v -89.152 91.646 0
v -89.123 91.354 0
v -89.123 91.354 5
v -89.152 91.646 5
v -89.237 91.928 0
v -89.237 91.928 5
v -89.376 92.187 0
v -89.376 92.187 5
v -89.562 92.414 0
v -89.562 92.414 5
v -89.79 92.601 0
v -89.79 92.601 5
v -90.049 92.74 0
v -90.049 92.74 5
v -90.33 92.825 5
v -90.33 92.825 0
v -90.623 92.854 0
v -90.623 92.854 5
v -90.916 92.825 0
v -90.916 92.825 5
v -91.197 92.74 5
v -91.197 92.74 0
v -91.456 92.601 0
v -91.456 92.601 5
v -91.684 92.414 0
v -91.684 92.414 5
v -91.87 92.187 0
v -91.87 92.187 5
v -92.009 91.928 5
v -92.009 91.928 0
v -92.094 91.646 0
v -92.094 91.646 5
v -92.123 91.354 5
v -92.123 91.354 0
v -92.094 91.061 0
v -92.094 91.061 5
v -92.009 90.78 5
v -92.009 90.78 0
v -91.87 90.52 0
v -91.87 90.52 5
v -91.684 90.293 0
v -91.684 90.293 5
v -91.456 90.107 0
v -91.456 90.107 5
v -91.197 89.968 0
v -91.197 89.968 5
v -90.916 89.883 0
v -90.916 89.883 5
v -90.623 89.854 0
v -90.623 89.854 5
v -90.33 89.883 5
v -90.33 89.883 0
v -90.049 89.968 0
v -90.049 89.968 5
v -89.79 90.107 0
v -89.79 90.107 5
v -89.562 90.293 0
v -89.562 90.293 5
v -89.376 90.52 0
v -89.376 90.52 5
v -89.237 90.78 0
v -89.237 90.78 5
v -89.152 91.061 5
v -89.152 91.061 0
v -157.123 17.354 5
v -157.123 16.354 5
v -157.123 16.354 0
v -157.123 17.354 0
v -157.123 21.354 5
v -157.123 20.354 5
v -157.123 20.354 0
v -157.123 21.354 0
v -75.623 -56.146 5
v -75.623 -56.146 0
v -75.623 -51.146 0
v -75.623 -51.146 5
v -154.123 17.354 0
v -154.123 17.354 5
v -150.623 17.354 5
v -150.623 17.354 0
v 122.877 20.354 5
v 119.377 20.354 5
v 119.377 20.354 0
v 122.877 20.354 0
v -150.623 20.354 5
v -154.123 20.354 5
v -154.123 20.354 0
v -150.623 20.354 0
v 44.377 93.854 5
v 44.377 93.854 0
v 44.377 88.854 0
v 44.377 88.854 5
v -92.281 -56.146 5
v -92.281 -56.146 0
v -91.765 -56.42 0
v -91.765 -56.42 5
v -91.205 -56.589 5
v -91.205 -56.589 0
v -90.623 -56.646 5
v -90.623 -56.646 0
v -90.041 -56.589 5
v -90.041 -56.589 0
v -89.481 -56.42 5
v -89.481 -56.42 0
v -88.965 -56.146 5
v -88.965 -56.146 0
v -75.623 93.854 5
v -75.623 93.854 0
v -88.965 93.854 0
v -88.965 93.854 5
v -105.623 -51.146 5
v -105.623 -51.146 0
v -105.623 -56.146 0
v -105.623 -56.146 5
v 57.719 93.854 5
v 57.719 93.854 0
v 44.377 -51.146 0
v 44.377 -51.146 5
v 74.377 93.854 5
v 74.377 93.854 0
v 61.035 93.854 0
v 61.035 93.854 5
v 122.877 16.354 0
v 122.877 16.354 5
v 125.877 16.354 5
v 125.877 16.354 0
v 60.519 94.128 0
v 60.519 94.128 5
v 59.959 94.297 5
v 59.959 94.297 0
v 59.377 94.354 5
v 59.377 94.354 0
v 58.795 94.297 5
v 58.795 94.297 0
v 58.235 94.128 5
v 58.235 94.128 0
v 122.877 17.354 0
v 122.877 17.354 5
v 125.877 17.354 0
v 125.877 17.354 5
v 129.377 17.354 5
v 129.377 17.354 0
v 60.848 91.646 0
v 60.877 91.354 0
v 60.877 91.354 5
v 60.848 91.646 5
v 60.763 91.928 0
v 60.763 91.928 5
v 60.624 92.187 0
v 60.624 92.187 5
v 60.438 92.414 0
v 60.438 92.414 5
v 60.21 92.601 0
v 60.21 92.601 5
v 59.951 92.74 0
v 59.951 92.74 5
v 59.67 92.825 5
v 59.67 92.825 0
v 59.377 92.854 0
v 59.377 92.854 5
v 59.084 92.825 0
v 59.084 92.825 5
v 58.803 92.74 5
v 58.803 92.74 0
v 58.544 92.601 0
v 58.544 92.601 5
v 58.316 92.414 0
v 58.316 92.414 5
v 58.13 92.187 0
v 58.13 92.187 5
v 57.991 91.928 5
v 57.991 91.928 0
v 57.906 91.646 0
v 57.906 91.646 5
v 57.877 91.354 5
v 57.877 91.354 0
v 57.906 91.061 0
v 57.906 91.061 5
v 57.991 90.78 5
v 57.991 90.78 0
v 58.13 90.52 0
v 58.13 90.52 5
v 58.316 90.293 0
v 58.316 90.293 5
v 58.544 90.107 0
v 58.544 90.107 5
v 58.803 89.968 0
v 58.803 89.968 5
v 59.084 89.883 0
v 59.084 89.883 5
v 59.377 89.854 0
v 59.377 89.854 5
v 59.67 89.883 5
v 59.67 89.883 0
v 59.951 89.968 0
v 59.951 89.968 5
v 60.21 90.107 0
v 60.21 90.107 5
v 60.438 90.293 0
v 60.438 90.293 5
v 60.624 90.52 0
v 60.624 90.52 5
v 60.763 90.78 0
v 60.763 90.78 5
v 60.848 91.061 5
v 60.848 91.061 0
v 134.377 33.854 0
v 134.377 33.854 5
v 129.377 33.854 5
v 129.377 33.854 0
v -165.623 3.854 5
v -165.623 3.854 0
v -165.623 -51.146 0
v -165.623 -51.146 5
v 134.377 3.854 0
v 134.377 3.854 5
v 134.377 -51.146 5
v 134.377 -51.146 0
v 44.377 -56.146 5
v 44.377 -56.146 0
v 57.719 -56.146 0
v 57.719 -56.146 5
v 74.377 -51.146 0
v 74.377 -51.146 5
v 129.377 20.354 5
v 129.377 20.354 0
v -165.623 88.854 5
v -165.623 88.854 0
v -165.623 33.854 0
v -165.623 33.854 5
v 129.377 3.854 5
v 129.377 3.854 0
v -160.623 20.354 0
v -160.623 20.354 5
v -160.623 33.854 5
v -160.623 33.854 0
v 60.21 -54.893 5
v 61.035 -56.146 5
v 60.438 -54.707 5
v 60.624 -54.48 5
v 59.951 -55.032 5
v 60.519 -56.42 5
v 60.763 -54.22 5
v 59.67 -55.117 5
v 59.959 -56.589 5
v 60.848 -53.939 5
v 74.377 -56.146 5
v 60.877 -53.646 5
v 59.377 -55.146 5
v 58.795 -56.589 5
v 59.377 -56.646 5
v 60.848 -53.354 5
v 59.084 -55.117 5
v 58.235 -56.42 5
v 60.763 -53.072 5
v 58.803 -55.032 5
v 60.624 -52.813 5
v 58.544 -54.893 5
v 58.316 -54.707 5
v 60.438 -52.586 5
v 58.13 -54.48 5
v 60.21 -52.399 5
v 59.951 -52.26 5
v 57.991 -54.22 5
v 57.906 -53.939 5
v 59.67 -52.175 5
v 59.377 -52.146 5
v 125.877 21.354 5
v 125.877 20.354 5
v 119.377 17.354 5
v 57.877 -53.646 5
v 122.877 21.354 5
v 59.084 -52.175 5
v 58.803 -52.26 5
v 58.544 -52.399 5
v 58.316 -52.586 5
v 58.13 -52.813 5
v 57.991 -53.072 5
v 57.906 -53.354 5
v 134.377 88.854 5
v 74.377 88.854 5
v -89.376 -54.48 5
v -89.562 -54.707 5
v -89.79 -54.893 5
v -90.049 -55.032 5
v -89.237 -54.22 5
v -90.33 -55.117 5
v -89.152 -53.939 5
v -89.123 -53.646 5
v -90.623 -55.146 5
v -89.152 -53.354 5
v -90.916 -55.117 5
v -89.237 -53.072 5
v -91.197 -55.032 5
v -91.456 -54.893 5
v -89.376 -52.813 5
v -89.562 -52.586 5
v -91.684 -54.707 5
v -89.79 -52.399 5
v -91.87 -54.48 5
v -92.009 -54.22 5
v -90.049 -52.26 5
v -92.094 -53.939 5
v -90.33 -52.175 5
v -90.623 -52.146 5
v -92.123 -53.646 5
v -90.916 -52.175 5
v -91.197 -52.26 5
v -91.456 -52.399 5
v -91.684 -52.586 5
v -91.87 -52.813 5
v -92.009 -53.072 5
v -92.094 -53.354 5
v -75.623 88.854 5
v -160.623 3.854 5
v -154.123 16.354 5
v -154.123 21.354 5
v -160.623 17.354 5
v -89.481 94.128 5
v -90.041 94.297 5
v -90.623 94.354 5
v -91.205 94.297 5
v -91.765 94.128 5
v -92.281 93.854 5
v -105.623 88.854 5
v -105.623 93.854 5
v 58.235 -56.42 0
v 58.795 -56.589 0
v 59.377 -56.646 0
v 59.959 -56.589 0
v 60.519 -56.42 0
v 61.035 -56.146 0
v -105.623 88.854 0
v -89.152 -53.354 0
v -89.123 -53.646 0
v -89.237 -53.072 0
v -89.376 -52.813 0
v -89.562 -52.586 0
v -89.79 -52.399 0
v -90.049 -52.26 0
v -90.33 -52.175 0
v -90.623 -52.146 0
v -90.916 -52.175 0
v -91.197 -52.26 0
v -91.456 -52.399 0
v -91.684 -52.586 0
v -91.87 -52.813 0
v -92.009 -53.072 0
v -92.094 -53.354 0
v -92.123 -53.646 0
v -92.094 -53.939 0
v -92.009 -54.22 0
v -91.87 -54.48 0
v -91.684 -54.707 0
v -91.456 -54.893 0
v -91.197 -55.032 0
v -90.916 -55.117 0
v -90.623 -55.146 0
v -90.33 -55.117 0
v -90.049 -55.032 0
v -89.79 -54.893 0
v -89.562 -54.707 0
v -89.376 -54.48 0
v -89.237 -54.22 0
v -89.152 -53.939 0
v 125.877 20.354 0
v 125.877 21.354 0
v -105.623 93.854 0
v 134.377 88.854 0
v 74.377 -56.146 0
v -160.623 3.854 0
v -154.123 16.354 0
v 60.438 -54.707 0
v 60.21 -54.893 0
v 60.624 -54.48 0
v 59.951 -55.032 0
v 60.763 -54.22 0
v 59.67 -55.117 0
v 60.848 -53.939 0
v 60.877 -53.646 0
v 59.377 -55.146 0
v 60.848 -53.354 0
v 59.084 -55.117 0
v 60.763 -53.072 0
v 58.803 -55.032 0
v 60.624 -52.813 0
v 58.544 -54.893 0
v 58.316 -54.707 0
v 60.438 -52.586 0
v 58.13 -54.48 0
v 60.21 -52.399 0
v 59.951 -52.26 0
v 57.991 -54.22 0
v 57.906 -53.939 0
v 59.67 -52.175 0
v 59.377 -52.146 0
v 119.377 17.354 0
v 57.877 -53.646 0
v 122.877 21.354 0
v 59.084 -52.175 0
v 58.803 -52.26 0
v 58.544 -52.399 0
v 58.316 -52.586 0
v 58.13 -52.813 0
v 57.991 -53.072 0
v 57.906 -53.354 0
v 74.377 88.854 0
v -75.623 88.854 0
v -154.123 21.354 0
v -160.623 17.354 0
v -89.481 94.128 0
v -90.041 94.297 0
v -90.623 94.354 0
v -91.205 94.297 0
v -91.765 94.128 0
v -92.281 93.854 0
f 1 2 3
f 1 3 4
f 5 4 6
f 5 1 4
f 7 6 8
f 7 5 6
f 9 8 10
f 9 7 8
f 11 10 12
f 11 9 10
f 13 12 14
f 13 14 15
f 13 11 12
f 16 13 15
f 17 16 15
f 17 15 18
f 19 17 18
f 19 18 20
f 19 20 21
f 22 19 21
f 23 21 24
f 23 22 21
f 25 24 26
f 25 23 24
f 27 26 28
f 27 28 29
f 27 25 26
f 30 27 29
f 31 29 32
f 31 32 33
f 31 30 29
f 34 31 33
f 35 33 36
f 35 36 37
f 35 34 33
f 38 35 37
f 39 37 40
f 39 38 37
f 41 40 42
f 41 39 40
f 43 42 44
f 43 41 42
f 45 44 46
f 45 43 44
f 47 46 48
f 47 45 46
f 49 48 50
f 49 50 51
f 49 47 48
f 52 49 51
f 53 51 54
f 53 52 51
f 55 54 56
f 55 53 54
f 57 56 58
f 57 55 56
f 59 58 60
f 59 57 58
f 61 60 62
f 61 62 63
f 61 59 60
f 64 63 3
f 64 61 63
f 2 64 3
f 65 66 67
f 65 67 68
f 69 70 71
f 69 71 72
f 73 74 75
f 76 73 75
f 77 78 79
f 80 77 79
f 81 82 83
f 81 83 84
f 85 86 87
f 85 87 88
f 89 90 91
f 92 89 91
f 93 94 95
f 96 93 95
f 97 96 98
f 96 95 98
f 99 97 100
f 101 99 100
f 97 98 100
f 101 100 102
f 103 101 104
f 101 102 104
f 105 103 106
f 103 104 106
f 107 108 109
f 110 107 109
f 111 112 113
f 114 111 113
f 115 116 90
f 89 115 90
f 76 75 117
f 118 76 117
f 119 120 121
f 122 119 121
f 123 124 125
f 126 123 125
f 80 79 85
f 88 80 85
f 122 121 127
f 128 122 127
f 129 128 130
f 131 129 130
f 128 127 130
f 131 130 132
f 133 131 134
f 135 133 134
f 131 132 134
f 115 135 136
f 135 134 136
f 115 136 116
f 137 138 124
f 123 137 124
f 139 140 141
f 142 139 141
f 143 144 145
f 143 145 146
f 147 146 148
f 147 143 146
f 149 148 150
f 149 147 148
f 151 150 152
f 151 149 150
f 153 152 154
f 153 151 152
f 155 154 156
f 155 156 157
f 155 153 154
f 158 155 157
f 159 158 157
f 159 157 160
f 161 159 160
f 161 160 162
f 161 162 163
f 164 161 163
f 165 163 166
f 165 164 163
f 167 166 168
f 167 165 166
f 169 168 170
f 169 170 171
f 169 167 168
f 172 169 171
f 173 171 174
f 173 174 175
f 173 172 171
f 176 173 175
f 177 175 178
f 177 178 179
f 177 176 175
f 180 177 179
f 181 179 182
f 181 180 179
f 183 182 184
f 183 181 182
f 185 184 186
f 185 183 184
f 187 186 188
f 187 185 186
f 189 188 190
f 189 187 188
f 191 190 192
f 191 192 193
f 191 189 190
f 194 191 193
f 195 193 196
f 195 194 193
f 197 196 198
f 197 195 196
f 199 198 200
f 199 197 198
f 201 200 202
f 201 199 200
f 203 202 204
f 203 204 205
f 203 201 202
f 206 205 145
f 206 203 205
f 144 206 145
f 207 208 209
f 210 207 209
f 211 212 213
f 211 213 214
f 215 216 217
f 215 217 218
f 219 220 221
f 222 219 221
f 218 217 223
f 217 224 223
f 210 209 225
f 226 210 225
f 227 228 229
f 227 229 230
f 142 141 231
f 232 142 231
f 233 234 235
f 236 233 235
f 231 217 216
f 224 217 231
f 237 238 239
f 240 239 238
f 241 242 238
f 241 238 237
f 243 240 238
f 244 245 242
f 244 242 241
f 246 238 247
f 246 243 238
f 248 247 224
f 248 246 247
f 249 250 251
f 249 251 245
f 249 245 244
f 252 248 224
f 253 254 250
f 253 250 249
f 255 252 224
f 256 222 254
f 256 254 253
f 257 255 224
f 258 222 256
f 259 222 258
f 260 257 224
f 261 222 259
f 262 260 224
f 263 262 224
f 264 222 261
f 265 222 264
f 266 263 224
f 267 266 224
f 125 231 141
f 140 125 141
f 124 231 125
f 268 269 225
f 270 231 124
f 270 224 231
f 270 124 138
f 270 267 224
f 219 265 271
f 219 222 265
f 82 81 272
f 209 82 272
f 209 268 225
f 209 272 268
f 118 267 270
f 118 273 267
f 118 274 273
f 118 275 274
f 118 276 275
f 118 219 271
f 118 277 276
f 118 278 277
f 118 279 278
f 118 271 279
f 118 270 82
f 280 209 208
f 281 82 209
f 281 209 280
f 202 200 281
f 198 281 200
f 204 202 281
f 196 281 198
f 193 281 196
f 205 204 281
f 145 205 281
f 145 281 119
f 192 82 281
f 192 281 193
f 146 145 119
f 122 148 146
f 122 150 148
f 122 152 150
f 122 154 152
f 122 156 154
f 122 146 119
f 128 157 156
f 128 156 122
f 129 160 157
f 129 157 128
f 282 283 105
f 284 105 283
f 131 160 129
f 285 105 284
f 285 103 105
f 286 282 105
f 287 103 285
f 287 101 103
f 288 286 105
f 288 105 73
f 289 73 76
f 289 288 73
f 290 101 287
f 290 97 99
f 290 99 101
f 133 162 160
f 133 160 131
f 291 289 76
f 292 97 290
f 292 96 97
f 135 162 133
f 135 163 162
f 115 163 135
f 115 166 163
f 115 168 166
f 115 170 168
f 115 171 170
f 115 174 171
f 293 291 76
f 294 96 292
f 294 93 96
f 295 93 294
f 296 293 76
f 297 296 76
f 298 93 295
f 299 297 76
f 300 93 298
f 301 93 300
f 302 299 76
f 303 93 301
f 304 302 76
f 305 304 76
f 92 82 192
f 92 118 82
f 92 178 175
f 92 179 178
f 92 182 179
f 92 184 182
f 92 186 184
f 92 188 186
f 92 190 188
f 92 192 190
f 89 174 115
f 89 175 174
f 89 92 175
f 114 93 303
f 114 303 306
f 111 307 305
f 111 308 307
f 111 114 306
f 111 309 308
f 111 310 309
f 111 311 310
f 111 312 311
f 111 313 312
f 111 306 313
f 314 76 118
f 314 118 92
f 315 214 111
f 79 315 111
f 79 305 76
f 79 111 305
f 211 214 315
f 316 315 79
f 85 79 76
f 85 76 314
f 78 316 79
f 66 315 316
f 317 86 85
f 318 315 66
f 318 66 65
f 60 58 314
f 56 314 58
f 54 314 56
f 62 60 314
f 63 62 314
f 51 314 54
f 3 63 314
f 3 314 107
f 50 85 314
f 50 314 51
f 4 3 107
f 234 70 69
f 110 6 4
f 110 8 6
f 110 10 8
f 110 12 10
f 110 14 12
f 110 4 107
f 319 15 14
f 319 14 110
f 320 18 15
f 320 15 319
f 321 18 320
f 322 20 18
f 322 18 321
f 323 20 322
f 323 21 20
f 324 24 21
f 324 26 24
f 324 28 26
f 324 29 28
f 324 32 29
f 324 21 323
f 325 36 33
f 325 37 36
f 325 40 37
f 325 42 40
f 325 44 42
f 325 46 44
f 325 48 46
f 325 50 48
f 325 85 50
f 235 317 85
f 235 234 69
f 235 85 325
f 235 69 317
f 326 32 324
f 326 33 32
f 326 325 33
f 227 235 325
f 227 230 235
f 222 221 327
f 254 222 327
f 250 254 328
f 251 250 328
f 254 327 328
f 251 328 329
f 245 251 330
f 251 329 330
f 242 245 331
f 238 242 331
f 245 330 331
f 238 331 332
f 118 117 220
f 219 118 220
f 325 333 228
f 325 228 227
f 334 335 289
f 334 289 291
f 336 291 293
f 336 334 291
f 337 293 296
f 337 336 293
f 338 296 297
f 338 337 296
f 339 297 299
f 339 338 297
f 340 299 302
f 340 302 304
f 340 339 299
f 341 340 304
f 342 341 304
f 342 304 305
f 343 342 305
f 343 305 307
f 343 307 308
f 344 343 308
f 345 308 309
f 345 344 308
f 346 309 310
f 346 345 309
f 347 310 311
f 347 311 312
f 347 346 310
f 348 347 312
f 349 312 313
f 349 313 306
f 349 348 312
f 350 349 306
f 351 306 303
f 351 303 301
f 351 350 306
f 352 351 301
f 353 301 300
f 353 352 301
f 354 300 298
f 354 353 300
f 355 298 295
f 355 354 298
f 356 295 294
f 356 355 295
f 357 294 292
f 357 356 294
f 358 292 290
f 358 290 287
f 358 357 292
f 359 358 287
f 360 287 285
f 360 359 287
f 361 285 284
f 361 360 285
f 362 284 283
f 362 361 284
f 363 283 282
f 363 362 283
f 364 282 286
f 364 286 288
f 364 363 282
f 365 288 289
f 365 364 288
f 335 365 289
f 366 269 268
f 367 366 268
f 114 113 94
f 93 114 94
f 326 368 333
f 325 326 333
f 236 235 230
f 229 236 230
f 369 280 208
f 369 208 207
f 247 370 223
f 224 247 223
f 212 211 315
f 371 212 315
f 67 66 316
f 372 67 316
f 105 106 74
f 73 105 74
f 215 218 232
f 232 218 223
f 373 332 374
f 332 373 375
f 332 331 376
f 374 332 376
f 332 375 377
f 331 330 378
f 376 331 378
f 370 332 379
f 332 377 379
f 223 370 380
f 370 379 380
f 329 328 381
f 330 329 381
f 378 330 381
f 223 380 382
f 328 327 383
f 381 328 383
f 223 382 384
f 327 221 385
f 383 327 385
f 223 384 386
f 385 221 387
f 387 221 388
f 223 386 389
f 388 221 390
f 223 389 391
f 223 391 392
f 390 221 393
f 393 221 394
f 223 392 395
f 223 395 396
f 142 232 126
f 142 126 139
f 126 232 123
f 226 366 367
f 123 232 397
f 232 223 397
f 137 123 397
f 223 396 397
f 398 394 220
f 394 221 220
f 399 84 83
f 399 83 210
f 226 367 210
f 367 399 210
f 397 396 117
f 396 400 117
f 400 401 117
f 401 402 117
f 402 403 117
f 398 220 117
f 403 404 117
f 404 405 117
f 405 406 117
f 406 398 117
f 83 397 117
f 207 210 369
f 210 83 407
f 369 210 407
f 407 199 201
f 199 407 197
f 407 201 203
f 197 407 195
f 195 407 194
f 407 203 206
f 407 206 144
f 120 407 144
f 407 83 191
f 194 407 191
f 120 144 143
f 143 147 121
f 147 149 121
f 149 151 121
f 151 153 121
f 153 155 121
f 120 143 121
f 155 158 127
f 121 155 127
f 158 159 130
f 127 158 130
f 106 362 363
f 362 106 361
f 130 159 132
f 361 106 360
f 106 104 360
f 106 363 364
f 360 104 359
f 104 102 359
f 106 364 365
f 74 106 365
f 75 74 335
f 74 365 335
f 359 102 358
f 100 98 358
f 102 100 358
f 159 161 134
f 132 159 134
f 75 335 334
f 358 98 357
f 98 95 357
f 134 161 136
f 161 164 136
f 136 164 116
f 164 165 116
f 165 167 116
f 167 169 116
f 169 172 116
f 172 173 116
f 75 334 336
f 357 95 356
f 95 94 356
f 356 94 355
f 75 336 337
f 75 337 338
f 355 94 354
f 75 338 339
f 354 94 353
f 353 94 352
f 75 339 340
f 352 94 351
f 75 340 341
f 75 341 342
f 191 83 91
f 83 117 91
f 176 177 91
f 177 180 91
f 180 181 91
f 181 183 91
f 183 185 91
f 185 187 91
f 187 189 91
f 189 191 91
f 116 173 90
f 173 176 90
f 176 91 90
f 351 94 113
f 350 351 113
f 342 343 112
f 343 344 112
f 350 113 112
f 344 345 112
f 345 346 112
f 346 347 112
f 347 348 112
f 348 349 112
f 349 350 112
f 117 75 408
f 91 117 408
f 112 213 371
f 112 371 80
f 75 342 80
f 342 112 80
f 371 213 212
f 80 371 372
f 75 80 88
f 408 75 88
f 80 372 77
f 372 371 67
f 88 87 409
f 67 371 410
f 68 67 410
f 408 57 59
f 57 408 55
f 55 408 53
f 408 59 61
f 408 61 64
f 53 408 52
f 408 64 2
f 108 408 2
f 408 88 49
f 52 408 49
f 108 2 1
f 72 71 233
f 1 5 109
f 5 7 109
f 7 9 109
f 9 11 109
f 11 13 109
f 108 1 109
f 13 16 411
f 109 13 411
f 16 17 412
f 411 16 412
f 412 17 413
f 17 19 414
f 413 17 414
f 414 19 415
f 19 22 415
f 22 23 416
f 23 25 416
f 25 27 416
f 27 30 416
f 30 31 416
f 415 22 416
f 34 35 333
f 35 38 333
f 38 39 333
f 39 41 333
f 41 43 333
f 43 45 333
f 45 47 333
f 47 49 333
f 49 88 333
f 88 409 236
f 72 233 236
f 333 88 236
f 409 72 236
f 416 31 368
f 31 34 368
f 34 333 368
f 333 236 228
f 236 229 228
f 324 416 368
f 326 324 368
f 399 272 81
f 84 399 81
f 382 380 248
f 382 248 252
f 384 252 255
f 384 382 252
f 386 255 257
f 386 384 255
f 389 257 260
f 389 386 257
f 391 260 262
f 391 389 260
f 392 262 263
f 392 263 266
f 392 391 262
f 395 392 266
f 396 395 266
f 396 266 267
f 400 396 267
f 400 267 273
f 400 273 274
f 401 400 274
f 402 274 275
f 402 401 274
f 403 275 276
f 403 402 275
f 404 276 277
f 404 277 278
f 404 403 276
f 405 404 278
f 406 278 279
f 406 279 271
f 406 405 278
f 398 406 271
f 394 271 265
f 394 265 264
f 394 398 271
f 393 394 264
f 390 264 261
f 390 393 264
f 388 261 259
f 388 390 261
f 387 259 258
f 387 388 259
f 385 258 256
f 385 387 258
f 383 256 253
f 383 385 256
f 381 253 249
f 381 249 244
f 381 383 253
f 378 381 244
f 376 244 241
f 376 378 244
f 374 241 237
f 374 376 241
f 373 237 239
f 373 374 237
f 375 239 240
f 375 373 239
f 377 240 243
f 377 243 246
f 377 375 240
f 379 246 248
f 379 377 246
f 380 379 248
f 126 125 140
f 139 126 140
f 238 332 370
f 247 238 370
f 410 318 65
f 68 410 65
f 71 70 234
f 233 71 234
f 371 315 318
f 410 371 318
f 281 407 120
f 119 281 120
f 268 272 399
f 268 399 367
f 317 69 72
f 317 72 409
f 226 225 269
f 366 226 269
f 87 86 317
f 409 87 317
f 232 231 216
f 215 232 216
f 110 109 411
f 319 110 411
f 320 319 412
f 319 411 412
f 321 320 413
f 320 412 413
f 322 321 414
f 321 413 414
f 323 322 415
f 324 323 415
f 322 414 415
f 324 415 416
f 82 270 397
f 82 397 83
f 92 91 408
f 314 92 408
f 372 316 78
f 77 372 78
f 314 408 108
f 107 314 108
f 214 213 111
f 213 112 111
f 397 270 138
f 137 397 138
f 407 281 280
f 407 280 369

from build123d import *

# Parameters (mm, degrees)
ESQUISSE1_R             = 1.5
BOSS_EXTRU_2_DEPTH      = 5
ESQUISSE2_W             = 5
ESQUISSE2_H             = 140
BOSS_EXTRU_3_DEPTH      = 5
ESQUISSE3_W             = 5
ESQUISSE3_H             = 140
BOSS_EXTRU_4_DEPTH      = 5
ESQUISSE4_W             = 3.5
ESQUISSE4_H             = 3
ESQUISSE4_W_2           = 3
ESQUISSE4_H_2           = 1
ENL_V_MAT_EXTRU_1_DEPTH = 10


with BuildPart() as part:
    # Esquisse1 → Boss.-Extru.2 (new body)
    with BuildSketch(Plane.XY):
        with BuildLine():
            Line((-160.623123651, 88.85383225), (-160.623123651, -51.14616775))
            Line((-160.623123651, -51.14616775), (-105.623123651, -51.14616775))
            Line((-105.623123651, -51.14616775), (-105.623123651, -56.14616775))
            Line((-105.623123651, -56.14616775), (-92.281436046, -56.14616775))
            ThreePointArc((-92.281436046, -56.14616775), (-90.623123651, -56.64616775), (-88.964811256, -56.14616775))
            Line((-88.964811256, -56.14616775), (-75.623123651, -56.14616775))
            Line((-75.623123651, -56.14616775), (-75.623123651, -51.14616775))
            Line((-75.623123651, -51.14616775), (44.376876349, -51.14616775))
            Line((44.376876349, -51.14616775), (44.376876349, -56.14616775))
            Line((44.376876349, -56.14616775), (57.718563954, -56.14616775))
            ThreePointArc((57.718563954, -56.14616775), (59.376876349, -56.64616775), (61.035188744, -56.14616775))
            Line((61.035188744, -56.14616775), (74.376876349, -56.14616775))
            Line((74.376876349, -56.14616775), (74.376876349, -51.14616775))
            Line((74.376876349, -51.14616775), (129.376876349, -51.14616775))
            Line((129.376876349, -51.14616775), (129.376876349, 88.85383225))
            Line((129.376876349, 88.85383225), (74.376876349, 88.85383225))
            Line((74.376876349, 88.85383225), (74.376876349, 93.85383225))
            Line((74.376876349, 93.85383225), (61.035188744, 93.85383225))
            ThreePointArc((61.035188744, 93.85383225), (59.376876349, 94.35383225), (57.718563954, 93.85383225))
            Line((57.718563954, 93.85383225), (44.376876349, 93.85383225))
            Line((44.376876349, 93.85383225), (44.376876349, 88.85383225))
            Line((44.376876349, 88.85383225), (-75.623123651, 88.85383225))
            Line((-75.623123651, 88.85383225), (-75.623123651, 93.85383225))
            Line((-75.623123651, 93.85383225), (-88.964811256, 93.85383225))
            ThreePointArc((-88.964811256, 93.85383225), (-90.623123651, 94.35383225), (-92.281436046, 93.85383225))
            Line((-92.281436046, 93.85383225), (-105.623123651, 93.85383225))
            Line((-105.623123651, 93.85383225), (-105.623123651, 88.85383225))
            Line((-105.623123651, 88.85383225), (-160.623123651, 88.85383225))
        make_face()
        with Locations((-90.623123651, -53.64616775)):
            Circle(ESQUISSE1_R, mode=Mode.SUBTRACT)
        with Locations((59.376876349, -53.64616775)):
            Circle(ESQUISSE1_R, mode=Mode.SUBTRACT)
        with Locations((-90.623123651, 91.35383225)):
            Circle(ESQUISSE1_R, mode=Mode.SUBTRACT)
        with Locations((59.376876349, 91.35383225)):
            Circle(ESQUISSE1_R, mode=Mode.SUBTRACT)
    extrude(amount=BOSS_EXTRU_2_DEPTH)

    # Esquisse2 → Boss.-Extru.3 (add)
    with BuildSketch(Plane.ZY.offset(160.623123651)):
        with Locations((2.5, 18.85383225)):
            Rectangle(ESQUISSE2_W, ESQUISSE2_H)
    extrude(amount=BOSS_EXTRU_3_DEPTH)

    # Esquisse3 → Boss.-Extru.4 (add)
    with BuildSketch(Plane(origin=(129.376876349, 0, 0), x_dir=(0, 0, -1), z_dir=(1, 0, 0))):
        with Locations((-2.5, 18.85383225)):
            Rectangle(ESQUISSE3_W, ESQUISSE3_H)
    extrude(amount=BOSS_EXTRU_4_DEPTH)

    # Esquisse4 → Enlèv. mat.-Extru.1 (cut)
    with BuildSketch(Plane.XY.offset(5)):
        Polygon((-165.623123651, 33.85383225), (-165.623123651, 3.85383225), (-160.623123651, 3.85383225), (-160.623123651, 17.35383225), (-160.623123651, 20.35383225), (-160.623123651, 33.85383225), align=None)
        with Locations((-158.873123651, 18.85383225)):
            Rectangle(ESQUISSE4_W, ESQUISSE4_H)
        with Locations((-155.623123651, 18.85383225)):
            Rectangle(ESQUISSE4_W_2, ESQUISSE4_H)
        with Locations((-155.623123651, 20.85383225)):
            Rectangle(ESQUISSE4_W_2, ESQUISSE4_H_2)
        with Locations((-155.623123651, 16.85383225)):
            Rectangle(ESQUISSE4_W_2, ESQUISSE4_H_2)
        with Locations((-152.373123651, 18.85383225)):
            Rectangle(ESQUISSE4_W, ESQUISSE4_H)
        Polygon((129.376876349, 20.35383225), (129.376876349, 17.35383225), (129.376876349, 3.85383225), (134.376876349, 3.85383225), (134.376876349, 33.85383225), (129.376876349, 33.85383225), align=None)
        with Locations((127.626876349, 18.85383225)):
            Rectangle(ESQUISSE4_W, ESQUISSE4_H)
        with Locations((124.376876349, 18.85383225)):
            Rectangle(ESQUISSE4_W_2, ESQUISSE4_H)
        with Locations((124.376876349, 20.85383225)):
            Rectangle(ESQUISSE4_W_2, ESQUISSE4_H_2)
        with Locations((124.376876349, 16.85383225)):
            Rectangle(ESQUISSE4_W_2, ESQUISSE4_H_2)
        with Locations((121.126876349, 18.85383225)):
            Rectangle(ESQUISSE4_W, ESQUISSE4_H)
    extrude(amount=-ENL_V_MAT_EXTRU_1_DEPTH, mode=Mode.SUBTRACT)


solid = part.part
